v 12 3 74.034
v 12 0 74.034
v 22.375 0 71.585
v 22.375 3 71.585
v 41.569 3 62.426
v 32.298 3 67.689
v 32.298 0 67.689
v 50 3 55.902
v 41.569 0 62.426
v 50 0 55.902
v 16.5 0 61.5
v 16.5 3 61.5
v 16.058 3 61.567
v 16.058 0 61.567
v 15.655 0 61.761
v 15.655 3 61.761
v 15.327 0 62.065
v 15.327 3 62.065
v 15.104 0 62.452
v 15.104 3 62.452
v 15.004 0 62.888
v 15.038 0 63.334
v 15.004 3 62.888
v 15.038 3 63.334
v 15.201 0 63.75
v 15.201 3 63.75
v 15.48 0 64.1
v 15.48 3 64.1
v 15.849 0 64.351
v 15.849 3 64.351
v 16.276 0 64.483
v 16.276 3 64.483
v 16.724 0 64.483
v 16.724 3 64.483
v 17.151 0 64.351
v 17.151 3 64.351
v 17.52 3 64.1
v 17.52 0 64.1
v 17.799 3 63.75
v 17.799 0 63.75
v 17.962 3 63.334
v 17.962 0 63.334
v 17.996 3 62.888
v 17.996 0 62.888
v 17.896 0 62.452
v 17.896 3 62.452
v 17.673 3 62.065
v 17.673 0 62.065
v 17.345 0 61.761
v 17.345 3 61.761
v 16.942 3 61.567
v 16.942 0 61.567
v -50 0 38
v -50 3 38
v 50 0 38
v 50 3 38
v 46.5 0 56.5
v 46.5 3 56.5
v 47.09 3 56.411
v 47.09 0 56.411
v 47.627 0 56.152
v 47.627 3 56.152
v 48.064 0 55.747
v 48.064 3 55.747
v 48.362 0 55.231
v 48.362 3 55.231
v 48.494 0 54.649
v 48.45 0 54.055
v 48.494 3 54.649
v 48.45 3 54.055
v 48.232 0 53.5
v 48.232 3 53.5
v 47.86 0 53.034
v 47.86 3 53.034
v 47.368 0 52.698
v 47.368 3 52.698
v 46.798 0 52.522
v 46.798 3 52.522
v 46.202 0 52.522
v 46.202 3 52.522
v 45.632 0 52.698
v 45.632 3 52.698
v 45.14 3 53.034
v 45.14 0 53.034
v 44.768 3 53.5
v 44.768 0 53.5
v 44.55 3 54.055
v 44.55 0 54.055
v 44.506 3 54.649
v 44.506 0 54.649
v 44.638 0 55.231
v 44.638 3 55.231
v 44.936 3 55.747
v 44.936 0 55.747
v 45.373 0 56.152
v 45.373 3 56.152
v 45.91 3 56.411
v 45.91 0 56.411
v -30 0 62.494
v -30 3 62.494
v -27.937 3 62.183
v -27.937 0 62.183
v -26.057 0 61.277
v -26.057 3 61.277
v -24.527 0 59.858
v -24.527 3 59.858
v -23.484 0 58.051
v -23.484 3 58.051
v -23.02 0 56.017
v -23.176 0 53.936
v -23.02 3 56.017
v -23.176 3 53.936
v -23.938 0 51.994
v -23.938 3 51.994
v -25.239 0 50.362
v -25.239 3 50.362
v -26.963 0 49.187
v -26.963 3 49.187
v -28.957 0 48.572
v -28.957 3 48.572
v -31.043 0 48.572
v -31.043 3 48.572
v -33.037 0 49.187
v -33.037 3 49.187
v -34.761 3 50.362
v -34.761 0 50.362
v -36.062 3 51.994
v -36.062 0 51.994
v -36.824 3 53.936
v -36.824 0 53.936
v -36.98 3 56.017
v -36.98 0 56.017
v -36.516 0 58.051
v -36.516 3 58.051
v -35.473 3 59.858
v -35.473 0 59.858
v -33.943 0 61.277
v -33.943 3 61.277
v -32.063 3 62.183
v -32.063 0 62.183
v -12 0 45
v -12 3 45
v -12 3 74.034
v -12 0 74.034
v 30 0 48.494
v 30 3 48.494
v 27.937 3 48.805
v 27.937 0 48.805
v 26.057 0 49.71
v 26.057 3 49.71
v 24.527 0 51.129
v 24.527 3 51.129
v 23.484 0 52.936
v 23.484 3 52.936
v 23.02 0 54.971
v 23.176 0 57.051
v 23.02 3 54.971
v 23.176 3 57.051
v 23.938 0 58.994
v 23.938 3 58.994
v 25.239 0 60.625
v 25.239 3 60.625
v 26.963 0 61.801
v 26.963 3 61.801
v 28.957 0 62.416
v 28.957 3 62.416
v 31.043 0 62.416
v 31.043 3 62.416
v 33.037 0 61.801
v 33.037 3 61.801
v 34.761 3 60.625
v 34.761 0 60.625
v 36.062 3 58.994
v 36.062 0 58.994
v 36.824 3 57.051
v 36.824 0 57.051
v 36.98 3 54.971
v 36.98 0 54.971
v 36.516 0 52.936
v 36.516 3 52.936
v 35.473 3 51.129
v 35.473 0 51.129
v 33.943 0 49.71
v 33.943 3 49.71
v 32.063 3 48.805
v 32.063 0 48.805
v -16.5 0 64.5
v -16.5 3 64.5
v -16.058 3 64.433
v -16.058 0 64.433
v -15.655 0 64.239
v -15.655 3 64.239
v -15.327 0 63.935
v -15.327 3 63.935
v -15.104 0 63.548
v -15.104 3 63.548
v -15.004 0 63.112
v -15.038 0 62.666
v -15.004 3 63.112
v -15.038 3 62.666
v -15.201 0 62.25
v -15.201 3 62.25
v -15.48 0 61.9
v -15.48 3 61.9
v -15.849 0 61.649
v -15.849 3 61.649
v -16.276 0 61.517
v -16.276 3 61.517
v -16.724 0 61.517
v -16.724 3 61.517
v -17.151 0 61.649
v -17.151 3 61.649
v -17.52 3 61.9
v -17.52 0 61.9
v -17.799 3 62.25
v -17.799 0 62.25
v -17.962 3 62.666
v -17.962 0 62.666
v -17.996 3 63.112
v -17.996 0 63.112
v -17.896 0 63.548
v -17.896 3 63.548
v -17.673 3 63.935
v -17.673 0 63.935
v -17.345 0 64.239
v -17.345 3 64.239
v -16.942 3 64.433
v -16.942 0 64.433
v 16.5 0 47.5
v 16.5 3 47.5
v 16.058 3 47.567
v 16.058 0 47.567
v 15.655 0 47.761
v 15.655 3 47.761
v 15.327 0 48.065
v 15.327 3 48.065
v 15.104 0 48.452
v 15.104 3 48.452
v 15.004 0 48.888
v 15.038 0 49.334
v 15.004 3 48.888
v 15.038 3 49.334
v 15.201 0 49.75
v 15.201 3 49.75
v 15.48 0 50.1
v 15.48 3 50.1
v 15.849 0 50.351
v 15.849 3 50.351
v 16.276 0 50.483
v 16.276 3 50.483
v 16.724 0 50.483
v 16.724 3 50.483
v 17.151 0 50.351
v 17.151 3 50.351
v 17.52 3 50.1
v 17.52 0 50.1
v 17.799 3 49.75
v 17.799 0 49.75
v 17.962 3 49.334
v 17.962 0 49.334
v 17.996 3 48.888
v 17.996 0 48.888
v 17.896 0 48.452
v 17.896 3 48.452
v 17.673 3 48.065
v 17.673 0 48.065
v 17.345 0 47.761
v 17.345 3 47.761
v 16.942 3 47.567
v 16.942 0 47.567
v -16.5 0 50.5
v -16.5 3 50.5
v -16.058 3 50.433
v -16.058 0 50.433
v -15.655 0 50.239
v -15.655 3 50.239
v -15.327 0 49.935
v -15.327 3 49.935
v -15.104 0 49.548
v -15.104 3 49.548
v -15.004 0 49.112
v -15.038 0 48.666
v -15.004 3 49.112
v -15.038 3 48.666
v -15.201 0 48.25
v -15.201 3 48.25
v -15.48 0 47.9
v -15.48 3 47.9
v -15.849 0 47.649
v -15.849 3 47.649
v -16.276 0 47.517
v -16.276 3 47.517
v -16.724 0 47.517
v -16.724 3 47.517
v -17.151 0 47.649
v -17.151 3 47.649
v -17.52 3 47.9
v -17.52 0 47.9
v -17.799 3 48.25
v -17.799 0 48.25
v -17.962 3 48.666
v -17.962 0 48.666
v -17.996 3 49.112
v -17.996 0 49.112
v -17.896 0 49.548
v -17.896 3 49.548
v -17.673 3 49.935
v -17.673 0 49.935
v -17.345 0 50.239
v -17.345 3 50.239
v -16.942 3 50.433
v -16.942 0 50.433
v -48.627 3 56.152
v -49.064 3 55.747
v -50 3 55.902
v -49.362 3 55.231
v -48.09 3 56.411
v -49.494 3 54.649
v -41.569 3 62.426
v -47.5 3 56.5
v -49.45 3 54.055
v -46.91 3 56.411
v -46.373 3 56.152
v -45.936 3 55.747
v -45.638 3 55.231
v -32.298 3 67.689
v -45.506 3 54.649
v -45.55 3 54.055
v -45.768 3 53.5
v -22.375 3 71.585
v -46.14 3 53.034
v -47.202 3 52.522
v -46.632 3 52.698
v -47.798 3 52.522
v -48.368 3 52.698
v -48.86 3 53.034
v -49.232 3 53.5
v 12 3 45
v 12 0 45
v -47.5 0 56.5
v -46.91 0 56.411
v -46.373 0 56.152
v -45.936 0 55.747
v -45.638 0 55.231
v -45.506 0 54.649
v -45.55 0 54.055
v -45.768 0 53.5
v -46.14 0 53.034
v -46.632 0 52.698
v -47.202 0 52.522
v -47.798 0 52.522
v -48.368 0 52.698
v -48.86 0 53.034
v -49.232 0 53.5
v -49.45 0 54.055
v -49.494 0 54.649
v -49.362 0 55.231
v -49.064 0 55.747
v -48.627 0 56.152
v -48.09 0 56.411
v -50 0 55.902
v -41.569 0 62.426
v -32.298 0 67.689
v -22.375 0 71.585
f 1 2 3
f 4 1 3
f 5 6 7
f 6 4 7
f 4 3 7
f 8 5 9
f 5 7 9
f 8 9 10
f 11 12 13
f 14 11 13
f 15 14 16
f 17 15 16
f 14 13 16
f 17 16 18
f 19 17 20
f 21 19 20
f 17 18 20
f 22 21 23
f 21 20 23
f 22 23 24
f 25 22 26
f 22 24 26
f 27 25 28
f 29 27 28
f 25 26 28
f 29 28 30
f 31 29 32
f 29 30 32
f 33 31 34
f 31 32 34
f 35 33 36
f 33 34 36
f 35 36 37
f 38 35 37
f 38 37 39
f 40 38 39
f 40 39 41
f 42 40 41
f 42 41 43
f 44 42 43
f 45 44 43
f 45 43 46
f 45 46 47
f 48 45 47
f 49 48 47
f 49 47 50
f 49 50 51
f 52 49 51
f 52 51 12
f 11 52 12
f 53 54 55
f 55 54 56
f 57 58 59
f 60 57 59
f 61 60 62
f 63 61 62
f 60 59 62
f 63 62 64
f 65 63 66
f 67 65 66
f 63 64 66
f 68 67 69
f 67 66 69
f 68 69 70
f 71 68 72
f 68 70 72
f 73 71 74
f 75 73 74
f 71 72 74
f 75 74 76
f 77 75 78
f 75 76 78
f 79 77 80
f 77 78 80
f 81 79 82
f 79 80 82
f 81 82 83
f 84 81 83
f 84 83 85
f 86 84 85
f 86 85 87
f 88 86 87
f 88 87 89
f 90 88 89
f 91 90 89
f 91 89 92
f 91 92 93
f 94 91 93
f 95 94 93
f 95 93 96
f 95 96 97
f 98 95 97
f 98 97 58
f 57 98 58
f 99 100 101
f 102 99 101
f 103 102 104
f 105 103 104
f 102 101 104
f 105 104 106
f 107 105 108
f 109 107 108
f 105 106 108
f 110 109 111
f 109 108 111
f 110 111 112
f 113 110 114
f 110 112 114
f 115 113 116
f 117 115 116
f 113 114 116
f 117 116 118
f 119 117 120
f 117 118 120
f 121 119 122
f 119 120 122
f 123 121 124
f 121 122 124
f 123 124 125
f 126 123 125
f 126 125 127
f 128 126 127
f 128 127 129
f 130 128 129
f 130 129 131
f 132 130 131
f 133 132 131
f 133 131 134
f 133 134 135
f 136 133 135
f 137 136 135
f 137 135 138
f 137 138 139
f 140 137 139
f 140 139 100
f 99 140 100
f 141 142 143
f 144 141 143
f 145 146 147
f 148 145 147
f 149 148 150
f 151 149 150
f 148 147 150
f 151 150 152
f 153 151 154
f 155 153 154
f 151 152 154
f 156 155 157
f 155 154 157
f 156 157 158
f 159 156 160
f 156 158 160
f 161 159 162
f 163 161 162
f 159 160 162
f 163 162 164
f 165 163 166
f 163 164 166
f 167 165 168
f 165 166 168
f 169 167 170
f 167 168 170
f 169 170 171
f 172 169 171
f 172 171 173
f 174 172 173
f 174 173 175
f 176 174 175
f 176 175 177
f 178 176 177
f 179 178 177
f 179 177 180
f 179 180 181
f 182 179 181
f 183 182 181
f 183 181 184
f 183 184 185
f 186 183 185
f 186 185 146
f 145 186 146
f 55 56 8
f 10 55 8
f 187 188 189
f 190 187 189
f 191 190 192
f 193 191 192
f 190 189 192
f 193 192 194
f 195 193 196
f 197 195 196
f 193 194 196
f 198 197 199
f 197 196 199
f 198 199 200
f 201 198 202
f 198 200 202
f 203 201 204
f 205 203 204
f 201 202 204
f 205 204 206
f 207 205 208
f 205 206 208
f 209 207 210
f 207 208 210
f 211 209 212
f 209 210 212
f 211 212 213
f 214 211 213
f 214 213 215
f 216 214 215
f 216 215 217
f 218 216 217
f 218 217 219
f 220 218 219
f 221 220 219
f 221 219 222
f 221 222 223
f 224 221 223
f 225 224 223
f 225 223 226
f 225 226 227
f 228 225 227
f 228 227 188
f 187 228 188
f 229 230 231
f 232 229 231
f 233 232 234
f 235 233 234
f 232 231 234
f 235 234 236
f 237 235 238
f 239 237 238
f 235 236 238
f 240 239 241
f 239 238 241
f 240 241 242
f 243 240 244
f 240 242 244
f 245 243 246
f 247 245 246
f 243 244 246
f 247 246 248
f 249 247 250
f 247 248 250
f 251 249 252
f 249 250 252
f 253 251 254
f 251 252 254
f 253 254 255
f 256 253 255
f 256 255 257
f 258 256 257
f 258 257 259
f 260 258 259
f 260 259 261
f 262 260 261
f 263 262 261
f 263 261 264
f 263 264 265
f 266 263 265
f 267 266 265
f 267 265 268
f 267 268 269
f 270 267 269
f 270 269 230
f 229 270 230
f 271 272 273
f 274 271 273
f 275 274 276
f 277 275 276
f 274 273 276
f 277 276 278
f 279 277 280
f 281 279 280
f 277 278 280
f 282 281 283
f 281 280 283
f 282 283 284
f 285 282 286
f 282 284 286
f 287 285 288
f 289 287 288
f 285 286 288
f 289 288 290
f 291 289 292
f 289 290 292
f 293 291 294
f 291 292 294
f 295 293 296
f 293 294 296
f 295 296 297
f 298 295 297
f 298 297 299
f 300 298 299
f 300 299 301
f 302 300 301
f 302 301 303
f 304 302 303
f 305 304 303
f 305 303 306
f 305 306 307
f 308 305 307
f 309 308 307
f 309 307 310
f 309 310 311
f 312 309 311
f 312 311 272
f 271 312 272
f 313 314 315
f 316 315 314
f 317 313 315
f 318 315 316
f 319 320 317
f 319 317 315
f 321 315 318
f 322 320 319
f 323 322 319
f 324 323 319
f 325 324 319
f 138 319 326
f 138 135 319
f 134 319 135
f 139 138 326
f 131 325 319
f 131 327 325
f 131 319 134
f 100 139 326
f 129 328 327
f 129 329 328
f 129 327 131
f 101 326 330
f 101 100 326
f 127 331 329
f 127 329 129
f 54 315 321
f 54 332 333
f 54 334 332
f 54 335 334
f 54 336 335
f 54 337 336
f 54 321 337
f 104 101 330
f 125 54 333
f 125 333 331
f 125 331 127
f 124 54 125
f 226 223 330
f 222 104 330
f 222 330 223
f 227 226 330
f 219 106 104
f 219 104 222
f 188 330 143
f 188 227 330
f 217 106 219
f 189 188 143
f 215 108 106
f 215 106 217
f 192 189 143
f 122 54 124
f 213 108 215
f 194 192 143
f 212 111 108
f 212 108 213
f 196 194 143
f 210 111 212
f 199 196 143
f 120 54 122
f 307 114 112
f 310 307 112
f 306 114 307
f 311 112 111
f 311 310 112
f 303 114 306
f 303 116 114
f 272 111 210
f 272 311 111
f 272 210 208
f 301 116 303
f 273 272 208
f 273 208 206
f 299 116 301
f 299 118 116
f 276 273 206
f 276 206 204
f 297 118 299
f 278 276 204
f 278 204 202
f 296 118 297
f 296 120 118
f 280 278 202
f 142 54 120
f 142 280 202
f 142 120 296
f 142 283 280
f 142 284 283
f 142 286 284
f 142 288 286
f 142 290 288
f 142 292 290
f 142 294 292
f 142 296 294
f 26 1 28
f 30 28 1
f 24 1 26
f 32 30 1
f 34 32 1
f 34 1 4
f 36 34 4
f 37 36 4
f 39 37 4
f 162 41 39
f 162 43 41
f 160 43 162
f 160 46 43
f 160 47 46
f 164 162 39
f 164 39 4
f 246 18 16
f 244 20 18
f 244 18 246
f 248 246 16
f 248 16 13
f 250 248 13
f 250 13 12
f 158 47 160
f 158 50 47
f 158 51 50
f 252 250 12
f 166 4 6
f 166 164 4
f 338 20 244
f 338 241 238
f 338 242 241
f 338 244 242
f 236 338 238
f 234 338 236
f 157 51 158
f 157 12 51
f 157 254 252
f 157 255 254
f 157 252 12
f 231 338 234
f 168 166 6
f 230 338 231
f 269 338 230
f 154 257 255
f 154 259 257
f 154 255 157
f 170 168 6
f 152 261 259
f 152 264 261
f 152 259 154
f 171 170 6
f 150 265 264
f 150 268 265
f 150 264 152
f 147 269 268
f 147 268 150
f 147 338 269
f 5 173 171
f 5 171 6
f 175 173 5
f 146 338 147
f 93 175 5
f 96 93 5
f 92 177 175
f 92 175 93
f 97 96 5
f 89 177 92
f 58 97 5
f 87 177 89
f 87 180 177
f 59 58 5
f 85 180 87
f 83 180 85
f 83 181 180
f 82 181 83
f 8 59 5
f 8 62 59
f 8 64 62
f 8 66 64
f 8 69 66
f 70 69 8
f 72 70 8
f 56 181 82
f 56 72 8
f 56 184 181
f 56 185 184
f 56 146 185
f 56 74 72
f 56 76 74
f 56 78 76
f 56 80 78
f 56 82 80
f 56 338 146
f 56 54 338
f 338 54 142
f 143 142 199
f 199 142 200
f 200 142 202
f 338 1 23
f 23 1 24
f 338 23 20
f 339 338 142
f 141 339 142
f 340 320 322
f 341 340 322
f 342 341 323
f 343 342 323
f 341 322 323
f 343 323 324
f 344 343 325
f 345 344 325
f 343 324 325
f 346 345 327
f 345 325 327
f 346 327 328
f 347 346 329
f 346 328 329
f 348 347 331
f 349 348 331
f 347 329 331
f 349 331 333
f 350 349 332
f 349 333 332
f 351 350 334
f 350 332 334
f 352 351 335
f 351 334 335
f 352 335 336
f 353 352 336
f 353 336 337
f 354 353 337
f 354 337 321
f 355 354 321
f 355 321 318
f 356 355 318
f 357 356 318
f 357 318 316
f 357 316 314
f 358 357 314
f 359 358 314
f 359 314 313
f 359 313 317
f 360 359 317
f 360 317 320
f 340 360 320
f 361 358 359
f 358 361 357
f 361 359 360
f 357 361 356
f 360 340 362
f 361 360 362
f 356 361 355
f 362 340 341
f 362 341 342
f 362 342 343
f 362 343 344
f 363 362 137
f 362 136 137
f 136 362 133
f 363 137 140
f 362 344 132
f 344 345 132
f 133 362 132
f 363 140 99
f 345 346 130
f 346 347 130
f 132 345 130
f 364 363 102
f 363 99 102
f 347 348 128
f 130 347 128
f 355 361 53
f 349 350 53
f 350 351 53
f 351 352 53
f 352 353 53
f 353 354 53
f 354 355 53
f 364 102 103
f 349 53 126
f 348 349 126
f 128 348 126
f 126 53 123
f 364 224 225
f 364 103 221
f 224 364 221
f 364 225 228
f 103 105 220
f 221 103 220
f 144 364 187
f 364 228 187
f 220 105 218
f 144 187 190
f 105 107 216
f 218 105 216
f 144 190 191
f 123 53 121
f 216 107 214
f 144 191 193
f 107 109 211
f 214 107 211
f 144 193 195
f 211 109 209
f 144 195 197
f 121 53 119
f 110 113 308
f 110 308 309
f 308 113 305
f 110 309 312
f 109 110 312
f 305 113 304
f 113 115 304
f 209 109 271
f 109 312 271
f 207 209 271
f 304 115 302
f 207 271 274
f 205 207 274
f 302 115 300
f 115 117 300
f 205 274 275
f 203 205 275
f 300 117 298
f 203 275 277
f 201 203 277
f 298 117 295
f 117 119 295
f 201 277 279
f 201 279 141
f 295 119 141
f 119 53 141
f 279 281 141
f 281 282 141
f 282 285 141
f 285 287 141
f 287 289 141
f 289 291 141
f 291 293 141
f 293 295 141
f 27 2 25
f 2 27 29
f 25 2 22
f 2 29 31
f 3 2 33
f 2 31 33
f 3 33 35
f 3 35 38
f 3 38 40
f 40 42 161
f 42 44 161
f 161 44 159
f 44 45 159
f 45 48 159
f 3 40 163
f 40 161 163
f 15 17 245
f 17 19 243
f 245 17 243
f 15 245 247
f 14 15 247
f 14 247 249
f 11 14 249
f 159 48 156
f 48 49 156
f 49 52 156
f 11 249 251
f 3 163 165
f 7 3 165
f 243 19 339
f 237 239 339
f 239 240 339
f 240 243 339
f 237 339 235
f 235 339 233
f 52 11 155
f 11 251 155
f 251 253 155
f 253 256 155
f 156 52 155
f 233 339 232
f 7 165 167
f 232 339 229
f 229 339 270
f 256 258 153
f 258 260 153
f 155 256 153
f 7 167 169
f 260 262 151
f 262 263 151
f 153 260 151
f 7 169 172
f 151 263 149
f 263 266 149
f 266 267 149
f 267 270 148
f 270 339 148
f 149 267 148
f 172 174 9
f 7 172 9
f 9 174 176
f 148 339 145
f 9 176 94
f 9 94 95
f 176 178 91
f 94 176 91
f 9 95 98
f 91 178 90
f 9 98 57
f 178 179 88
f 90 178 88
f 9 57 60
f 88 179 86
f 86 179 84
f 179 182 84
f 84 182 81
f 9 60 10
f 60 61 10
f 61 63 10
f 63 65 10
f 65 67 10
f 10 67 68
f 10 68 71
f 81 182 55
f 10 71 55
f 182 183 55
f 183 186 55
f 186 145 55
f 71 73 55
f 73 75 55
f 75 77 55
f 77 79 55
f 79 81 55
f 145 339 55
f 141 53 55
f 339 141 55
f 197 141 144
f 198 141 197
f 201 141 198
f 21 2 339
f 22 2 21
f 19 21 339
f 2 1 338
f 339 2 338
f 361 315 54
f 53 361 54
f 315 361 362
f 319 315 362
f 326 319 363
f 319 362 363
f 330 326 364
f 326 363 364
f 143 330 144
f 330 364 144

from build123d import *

# Parameters (mm, degrees)
CROQUIS1_R              = 75
SALIENTE_EXTRUIR1_DEPTH = 3
CROQUIS4_W              = 35
CROQUIS4_H              = 23
CORTAR_EXTRUIR9_DEPTH   = 107.108435103
CROQUIS5_W              = 31
CROQUIS5_H              = 56
CROQUIS5_W_2            = 25
CORTAR_EXTRUIR10_DEPTH  = 107.108435103
CROQUIS6_W              = 29.5
CROQUIS6_H              = 35
CORTAR_EXTRUIR11_DEPTH  = 91.188691087
CROQUIS7_R              = 1.59
CORTAR_EXTRUIR12_DEPTH  = 91.188691087
CORTAR_EXTRUIR13_DEPTH  = 91.188691087
CROQUIS9_R              = 7
CROQUIS9_R_2            = 2
CORTAR_EXTRUIR15_DEPTH  = 90.38679992
CROQUIS10_W             = 100
CROQUIS10_H             = 10
CROQUIS10_R             = 2
SALIENTE_EXTRUIR2_DEPTH = 3
CROQUIS11_R             = 1.5
CORTAR_EXTRUIR16_DEPTH  = 90.38679992
CROQUIS12_W             = 100
CROQUIS12_H             = 103
CORTAR_EXTRUIR17_DEPTH  = 90.38679992


with BuildPart() as part:
    # Croquis1 → Saliente-Extruir1 (new body)
    with BuildSketch(Plane(origin=(0, 0, 0), x_dir=(1, 0, 0), z_dir=(0, 1, 0))):
        with Locations(Location((0, 0, 0), (0, 0, 270))):
            Circle(CROQUIS1_R)
    extrude(amount=SALIENTE_EXTRUIR1_DEPTH)

    # Croquis4 → Cortar-Extruir9 (cut, through all)
    with BuildSketch(Plane(origin=(0, 3, 0), x_dir=(1, 0, 0), z_dir=(0, 1, 0))):
        with Locations((0, -18.5)):
            Rectangle(CROQUIS4_W, CROQUIS4_H)
    extrude(amount=-CORTAR_EXTRUIR9_DEPTH, mode=Mode.SUBTRACT)

    # Croquis5 → Cortar-Extruir10 (cut, through all)
    with BuildSketch(Plane(origin=(0, 3, 0), x_dir=(1, 0, 0), z_dir=(0, 1, 0))):
        Polygon((-50, 55), (0, 55), (0, 77), (-53, 77), (-53, 55), align=None)
        Polygon((0, 77), (0, 55), (50, 55), (53, 55), (53, 77), align=None)
        Polygon((-50, 0), (-50, 55), (-53, 55), (-81, 55), (-81, 0), align=None)
        Polygon((53, 55), (50, 55), (50, 0), (75, 0), (75, 55), align=None)
        with Locations((-65.5, -28)):
            Rectangle(CROQUIS5_W, CROQUIS5_H)
        with Locations((62.5, -28)):
            Rectangle(CROQUIS5_W_2, CROQUIS5_H)
    extrude(amount=-CORTAR_EXTRUIR10_DEPTH, mode=Mode.SUBTRACT)

    # Croquis6 → Cortar-Extruir11 (cut, through all)
    with BuildSketch(Plane(origin=(0, 3, 0), x_dir=(1, 0, 0), z_dir=(0, 1, 0))):
        with Locations((-35.25, -20.5)):
            Rectangle(CROQUIS6_W, CROQUIS6_H)
        with Locations((35.25, -20.5)):
            Rectangle(CROQUIS6_W, CROQUIS6_H)
    extrude(amount=-CORTAR_EXTRUIR11_DEPTH, mode=Mode.SUBTRACT)

    # Croquis7 → Cortar-Extruir12 (cut, through all)
    with BuildSketch(Plane(origin=(0, 3, 0), x_dir=(1, 0, 0), z_dir=(0, 1, 0))):
        with Locations(Location((-46.52, 47.87, 0), (0, 0, 270))):
            Circle(CROQUIS7_R)
        with Locations(Location((-40.17, -0.46, 0), (0, 0, 270))):
            Circle(CROQUIS7_R)
        with Locations(Location((36.03, 47.8, 0), (0, 0, 270))):
            Circle(CROQUIS7_R)
        with Locations(Location((34.76, -0.46, 0), (0, 0, 270))):
            Circle(CROQUIS7_R)
    extrude(amount=-CORTAR_EXTRUIR12_DEPTH, mode=Mode.SUBTRACT)

    # Croquis8 → Cortar-Extruir13 (cut, through all)
    with BuildSketch(Plane(origin=(0, 3, 0), x_dir=(1, 0, 0), z_dir=(0, 1, 0))):
        with BuildLine():
            ThreePointArc((-12, -74.033776076), (-6.019418341, -74.758053766), (0, -75))
            Line((0, -75), (0, -45))
            Line((0, -45), (-12, -45))
            Line((-12, -45), (-12, -74.033776076))
        make_face()
        with BuildLine():
            Line((0, -45), (0, -75))
            ThreePointArc((0, -75), (6.019418341, -74.758053766), (12, -74.033776076))
            Line((12, -74.033776076), (12, -45))
            Line((12, -45), (0, -45))
        make_face()
    extrude(amount=-CORTAR_EXTRUIR13_DEPTH, mode=Mode.SUBTRACT)

    # Croquis9 → Cortar-Extruir15 (cut, through all)
    with BuildSketch(Plane(origin=(0, 3, 0), x_dir=(1, 0, 0), z_dir=(0, 1, 0))):
        with Locations(Location((-30, -55.493776076, 0), (0, 0, 270))):
            Circle(CROQUIS9_R)
        with Locations(Location((30, -55.493776076, 0), (0, 0, 90))):
            Circle(CROQUIS9_R)
        with Locations(Location((-47.5, -54.5, 0), (0, 0, 270))):
            Circle(CROQUIS9_R_2)
        with Locations(Location((46.5, -54.5, 0), (0, 0, 270))):
            Circle(CROQUIS9_R_2)
    extrude(amount=-CORTAR_EXTRUIR15_DEPTH, mode=Mode.SUBTRACT)

    # Croquis10 → Saliente-Extruir2 (add)
    with BuildSketch(Plane(origin=(0, 3, 0), x_dir=(1, 0, 0), z_dir=(0, 1, 0))):
        with Locations((0, 60)):
            Rectangle(CROQUIS10_W, CROQUIS10_H)
        with Locations(Location((-45, 60, 0), (0, 0, 270))):
            Circle(CROQUIS10_R, mode=Mode.SUBTRACT)
        with Locations(Location((45, 60, 0), (0, 0, 270))):
            Circle(CROQUIS10_R, mode=Mode.SUBTRACT)
    extrude(amount=-SALIENTE_EXTRUIR2_DEPTH)

    # Croquis11 → Cortar-Extruir16 (cut, through all)
    with BuildSketch(Plane(origin=(0, 3, 0), x_dir=(1, 0, 0), z_dir=(0, 1, 0))):
        with Locations(Location((-16.5, -49, 0), (0, 0, 270))):
            Circle(CROQUIS11_R)
        with Locations(Location((-16.5, -63, 0), (0, 0, 270))):
            Circle(CROQUIS11_R)
        with Locations(Location((16.5, -63, 0), (0, 0, 90))):
            Circle(CROQUIS11_R)
        with Locations(Location((16.5, -49, 0), (0, 0, 90))):
            Circle(CROQUIS11_R)
    extrude(amount=-CORTAR_EXTRUIR16_DEPTH, mode=Mode.SUBTRACT)

    # Croquis12 → Cortar-Extruir17 (cut, through all)
    with BuildSketch(Plane(origin=(0, 3, 0), x_dir=(1, 0, 0), z_dir=(0, 1, 0))):
        with Locations((0, 13.5)):
            Rectangle(CROQUIS12_W, CROQUIS12_H)
    extrude(amount=-CORTAR_EXTRUIR17_DEPTH, mode=Mode.SUBTRACT)


solid = part.part
